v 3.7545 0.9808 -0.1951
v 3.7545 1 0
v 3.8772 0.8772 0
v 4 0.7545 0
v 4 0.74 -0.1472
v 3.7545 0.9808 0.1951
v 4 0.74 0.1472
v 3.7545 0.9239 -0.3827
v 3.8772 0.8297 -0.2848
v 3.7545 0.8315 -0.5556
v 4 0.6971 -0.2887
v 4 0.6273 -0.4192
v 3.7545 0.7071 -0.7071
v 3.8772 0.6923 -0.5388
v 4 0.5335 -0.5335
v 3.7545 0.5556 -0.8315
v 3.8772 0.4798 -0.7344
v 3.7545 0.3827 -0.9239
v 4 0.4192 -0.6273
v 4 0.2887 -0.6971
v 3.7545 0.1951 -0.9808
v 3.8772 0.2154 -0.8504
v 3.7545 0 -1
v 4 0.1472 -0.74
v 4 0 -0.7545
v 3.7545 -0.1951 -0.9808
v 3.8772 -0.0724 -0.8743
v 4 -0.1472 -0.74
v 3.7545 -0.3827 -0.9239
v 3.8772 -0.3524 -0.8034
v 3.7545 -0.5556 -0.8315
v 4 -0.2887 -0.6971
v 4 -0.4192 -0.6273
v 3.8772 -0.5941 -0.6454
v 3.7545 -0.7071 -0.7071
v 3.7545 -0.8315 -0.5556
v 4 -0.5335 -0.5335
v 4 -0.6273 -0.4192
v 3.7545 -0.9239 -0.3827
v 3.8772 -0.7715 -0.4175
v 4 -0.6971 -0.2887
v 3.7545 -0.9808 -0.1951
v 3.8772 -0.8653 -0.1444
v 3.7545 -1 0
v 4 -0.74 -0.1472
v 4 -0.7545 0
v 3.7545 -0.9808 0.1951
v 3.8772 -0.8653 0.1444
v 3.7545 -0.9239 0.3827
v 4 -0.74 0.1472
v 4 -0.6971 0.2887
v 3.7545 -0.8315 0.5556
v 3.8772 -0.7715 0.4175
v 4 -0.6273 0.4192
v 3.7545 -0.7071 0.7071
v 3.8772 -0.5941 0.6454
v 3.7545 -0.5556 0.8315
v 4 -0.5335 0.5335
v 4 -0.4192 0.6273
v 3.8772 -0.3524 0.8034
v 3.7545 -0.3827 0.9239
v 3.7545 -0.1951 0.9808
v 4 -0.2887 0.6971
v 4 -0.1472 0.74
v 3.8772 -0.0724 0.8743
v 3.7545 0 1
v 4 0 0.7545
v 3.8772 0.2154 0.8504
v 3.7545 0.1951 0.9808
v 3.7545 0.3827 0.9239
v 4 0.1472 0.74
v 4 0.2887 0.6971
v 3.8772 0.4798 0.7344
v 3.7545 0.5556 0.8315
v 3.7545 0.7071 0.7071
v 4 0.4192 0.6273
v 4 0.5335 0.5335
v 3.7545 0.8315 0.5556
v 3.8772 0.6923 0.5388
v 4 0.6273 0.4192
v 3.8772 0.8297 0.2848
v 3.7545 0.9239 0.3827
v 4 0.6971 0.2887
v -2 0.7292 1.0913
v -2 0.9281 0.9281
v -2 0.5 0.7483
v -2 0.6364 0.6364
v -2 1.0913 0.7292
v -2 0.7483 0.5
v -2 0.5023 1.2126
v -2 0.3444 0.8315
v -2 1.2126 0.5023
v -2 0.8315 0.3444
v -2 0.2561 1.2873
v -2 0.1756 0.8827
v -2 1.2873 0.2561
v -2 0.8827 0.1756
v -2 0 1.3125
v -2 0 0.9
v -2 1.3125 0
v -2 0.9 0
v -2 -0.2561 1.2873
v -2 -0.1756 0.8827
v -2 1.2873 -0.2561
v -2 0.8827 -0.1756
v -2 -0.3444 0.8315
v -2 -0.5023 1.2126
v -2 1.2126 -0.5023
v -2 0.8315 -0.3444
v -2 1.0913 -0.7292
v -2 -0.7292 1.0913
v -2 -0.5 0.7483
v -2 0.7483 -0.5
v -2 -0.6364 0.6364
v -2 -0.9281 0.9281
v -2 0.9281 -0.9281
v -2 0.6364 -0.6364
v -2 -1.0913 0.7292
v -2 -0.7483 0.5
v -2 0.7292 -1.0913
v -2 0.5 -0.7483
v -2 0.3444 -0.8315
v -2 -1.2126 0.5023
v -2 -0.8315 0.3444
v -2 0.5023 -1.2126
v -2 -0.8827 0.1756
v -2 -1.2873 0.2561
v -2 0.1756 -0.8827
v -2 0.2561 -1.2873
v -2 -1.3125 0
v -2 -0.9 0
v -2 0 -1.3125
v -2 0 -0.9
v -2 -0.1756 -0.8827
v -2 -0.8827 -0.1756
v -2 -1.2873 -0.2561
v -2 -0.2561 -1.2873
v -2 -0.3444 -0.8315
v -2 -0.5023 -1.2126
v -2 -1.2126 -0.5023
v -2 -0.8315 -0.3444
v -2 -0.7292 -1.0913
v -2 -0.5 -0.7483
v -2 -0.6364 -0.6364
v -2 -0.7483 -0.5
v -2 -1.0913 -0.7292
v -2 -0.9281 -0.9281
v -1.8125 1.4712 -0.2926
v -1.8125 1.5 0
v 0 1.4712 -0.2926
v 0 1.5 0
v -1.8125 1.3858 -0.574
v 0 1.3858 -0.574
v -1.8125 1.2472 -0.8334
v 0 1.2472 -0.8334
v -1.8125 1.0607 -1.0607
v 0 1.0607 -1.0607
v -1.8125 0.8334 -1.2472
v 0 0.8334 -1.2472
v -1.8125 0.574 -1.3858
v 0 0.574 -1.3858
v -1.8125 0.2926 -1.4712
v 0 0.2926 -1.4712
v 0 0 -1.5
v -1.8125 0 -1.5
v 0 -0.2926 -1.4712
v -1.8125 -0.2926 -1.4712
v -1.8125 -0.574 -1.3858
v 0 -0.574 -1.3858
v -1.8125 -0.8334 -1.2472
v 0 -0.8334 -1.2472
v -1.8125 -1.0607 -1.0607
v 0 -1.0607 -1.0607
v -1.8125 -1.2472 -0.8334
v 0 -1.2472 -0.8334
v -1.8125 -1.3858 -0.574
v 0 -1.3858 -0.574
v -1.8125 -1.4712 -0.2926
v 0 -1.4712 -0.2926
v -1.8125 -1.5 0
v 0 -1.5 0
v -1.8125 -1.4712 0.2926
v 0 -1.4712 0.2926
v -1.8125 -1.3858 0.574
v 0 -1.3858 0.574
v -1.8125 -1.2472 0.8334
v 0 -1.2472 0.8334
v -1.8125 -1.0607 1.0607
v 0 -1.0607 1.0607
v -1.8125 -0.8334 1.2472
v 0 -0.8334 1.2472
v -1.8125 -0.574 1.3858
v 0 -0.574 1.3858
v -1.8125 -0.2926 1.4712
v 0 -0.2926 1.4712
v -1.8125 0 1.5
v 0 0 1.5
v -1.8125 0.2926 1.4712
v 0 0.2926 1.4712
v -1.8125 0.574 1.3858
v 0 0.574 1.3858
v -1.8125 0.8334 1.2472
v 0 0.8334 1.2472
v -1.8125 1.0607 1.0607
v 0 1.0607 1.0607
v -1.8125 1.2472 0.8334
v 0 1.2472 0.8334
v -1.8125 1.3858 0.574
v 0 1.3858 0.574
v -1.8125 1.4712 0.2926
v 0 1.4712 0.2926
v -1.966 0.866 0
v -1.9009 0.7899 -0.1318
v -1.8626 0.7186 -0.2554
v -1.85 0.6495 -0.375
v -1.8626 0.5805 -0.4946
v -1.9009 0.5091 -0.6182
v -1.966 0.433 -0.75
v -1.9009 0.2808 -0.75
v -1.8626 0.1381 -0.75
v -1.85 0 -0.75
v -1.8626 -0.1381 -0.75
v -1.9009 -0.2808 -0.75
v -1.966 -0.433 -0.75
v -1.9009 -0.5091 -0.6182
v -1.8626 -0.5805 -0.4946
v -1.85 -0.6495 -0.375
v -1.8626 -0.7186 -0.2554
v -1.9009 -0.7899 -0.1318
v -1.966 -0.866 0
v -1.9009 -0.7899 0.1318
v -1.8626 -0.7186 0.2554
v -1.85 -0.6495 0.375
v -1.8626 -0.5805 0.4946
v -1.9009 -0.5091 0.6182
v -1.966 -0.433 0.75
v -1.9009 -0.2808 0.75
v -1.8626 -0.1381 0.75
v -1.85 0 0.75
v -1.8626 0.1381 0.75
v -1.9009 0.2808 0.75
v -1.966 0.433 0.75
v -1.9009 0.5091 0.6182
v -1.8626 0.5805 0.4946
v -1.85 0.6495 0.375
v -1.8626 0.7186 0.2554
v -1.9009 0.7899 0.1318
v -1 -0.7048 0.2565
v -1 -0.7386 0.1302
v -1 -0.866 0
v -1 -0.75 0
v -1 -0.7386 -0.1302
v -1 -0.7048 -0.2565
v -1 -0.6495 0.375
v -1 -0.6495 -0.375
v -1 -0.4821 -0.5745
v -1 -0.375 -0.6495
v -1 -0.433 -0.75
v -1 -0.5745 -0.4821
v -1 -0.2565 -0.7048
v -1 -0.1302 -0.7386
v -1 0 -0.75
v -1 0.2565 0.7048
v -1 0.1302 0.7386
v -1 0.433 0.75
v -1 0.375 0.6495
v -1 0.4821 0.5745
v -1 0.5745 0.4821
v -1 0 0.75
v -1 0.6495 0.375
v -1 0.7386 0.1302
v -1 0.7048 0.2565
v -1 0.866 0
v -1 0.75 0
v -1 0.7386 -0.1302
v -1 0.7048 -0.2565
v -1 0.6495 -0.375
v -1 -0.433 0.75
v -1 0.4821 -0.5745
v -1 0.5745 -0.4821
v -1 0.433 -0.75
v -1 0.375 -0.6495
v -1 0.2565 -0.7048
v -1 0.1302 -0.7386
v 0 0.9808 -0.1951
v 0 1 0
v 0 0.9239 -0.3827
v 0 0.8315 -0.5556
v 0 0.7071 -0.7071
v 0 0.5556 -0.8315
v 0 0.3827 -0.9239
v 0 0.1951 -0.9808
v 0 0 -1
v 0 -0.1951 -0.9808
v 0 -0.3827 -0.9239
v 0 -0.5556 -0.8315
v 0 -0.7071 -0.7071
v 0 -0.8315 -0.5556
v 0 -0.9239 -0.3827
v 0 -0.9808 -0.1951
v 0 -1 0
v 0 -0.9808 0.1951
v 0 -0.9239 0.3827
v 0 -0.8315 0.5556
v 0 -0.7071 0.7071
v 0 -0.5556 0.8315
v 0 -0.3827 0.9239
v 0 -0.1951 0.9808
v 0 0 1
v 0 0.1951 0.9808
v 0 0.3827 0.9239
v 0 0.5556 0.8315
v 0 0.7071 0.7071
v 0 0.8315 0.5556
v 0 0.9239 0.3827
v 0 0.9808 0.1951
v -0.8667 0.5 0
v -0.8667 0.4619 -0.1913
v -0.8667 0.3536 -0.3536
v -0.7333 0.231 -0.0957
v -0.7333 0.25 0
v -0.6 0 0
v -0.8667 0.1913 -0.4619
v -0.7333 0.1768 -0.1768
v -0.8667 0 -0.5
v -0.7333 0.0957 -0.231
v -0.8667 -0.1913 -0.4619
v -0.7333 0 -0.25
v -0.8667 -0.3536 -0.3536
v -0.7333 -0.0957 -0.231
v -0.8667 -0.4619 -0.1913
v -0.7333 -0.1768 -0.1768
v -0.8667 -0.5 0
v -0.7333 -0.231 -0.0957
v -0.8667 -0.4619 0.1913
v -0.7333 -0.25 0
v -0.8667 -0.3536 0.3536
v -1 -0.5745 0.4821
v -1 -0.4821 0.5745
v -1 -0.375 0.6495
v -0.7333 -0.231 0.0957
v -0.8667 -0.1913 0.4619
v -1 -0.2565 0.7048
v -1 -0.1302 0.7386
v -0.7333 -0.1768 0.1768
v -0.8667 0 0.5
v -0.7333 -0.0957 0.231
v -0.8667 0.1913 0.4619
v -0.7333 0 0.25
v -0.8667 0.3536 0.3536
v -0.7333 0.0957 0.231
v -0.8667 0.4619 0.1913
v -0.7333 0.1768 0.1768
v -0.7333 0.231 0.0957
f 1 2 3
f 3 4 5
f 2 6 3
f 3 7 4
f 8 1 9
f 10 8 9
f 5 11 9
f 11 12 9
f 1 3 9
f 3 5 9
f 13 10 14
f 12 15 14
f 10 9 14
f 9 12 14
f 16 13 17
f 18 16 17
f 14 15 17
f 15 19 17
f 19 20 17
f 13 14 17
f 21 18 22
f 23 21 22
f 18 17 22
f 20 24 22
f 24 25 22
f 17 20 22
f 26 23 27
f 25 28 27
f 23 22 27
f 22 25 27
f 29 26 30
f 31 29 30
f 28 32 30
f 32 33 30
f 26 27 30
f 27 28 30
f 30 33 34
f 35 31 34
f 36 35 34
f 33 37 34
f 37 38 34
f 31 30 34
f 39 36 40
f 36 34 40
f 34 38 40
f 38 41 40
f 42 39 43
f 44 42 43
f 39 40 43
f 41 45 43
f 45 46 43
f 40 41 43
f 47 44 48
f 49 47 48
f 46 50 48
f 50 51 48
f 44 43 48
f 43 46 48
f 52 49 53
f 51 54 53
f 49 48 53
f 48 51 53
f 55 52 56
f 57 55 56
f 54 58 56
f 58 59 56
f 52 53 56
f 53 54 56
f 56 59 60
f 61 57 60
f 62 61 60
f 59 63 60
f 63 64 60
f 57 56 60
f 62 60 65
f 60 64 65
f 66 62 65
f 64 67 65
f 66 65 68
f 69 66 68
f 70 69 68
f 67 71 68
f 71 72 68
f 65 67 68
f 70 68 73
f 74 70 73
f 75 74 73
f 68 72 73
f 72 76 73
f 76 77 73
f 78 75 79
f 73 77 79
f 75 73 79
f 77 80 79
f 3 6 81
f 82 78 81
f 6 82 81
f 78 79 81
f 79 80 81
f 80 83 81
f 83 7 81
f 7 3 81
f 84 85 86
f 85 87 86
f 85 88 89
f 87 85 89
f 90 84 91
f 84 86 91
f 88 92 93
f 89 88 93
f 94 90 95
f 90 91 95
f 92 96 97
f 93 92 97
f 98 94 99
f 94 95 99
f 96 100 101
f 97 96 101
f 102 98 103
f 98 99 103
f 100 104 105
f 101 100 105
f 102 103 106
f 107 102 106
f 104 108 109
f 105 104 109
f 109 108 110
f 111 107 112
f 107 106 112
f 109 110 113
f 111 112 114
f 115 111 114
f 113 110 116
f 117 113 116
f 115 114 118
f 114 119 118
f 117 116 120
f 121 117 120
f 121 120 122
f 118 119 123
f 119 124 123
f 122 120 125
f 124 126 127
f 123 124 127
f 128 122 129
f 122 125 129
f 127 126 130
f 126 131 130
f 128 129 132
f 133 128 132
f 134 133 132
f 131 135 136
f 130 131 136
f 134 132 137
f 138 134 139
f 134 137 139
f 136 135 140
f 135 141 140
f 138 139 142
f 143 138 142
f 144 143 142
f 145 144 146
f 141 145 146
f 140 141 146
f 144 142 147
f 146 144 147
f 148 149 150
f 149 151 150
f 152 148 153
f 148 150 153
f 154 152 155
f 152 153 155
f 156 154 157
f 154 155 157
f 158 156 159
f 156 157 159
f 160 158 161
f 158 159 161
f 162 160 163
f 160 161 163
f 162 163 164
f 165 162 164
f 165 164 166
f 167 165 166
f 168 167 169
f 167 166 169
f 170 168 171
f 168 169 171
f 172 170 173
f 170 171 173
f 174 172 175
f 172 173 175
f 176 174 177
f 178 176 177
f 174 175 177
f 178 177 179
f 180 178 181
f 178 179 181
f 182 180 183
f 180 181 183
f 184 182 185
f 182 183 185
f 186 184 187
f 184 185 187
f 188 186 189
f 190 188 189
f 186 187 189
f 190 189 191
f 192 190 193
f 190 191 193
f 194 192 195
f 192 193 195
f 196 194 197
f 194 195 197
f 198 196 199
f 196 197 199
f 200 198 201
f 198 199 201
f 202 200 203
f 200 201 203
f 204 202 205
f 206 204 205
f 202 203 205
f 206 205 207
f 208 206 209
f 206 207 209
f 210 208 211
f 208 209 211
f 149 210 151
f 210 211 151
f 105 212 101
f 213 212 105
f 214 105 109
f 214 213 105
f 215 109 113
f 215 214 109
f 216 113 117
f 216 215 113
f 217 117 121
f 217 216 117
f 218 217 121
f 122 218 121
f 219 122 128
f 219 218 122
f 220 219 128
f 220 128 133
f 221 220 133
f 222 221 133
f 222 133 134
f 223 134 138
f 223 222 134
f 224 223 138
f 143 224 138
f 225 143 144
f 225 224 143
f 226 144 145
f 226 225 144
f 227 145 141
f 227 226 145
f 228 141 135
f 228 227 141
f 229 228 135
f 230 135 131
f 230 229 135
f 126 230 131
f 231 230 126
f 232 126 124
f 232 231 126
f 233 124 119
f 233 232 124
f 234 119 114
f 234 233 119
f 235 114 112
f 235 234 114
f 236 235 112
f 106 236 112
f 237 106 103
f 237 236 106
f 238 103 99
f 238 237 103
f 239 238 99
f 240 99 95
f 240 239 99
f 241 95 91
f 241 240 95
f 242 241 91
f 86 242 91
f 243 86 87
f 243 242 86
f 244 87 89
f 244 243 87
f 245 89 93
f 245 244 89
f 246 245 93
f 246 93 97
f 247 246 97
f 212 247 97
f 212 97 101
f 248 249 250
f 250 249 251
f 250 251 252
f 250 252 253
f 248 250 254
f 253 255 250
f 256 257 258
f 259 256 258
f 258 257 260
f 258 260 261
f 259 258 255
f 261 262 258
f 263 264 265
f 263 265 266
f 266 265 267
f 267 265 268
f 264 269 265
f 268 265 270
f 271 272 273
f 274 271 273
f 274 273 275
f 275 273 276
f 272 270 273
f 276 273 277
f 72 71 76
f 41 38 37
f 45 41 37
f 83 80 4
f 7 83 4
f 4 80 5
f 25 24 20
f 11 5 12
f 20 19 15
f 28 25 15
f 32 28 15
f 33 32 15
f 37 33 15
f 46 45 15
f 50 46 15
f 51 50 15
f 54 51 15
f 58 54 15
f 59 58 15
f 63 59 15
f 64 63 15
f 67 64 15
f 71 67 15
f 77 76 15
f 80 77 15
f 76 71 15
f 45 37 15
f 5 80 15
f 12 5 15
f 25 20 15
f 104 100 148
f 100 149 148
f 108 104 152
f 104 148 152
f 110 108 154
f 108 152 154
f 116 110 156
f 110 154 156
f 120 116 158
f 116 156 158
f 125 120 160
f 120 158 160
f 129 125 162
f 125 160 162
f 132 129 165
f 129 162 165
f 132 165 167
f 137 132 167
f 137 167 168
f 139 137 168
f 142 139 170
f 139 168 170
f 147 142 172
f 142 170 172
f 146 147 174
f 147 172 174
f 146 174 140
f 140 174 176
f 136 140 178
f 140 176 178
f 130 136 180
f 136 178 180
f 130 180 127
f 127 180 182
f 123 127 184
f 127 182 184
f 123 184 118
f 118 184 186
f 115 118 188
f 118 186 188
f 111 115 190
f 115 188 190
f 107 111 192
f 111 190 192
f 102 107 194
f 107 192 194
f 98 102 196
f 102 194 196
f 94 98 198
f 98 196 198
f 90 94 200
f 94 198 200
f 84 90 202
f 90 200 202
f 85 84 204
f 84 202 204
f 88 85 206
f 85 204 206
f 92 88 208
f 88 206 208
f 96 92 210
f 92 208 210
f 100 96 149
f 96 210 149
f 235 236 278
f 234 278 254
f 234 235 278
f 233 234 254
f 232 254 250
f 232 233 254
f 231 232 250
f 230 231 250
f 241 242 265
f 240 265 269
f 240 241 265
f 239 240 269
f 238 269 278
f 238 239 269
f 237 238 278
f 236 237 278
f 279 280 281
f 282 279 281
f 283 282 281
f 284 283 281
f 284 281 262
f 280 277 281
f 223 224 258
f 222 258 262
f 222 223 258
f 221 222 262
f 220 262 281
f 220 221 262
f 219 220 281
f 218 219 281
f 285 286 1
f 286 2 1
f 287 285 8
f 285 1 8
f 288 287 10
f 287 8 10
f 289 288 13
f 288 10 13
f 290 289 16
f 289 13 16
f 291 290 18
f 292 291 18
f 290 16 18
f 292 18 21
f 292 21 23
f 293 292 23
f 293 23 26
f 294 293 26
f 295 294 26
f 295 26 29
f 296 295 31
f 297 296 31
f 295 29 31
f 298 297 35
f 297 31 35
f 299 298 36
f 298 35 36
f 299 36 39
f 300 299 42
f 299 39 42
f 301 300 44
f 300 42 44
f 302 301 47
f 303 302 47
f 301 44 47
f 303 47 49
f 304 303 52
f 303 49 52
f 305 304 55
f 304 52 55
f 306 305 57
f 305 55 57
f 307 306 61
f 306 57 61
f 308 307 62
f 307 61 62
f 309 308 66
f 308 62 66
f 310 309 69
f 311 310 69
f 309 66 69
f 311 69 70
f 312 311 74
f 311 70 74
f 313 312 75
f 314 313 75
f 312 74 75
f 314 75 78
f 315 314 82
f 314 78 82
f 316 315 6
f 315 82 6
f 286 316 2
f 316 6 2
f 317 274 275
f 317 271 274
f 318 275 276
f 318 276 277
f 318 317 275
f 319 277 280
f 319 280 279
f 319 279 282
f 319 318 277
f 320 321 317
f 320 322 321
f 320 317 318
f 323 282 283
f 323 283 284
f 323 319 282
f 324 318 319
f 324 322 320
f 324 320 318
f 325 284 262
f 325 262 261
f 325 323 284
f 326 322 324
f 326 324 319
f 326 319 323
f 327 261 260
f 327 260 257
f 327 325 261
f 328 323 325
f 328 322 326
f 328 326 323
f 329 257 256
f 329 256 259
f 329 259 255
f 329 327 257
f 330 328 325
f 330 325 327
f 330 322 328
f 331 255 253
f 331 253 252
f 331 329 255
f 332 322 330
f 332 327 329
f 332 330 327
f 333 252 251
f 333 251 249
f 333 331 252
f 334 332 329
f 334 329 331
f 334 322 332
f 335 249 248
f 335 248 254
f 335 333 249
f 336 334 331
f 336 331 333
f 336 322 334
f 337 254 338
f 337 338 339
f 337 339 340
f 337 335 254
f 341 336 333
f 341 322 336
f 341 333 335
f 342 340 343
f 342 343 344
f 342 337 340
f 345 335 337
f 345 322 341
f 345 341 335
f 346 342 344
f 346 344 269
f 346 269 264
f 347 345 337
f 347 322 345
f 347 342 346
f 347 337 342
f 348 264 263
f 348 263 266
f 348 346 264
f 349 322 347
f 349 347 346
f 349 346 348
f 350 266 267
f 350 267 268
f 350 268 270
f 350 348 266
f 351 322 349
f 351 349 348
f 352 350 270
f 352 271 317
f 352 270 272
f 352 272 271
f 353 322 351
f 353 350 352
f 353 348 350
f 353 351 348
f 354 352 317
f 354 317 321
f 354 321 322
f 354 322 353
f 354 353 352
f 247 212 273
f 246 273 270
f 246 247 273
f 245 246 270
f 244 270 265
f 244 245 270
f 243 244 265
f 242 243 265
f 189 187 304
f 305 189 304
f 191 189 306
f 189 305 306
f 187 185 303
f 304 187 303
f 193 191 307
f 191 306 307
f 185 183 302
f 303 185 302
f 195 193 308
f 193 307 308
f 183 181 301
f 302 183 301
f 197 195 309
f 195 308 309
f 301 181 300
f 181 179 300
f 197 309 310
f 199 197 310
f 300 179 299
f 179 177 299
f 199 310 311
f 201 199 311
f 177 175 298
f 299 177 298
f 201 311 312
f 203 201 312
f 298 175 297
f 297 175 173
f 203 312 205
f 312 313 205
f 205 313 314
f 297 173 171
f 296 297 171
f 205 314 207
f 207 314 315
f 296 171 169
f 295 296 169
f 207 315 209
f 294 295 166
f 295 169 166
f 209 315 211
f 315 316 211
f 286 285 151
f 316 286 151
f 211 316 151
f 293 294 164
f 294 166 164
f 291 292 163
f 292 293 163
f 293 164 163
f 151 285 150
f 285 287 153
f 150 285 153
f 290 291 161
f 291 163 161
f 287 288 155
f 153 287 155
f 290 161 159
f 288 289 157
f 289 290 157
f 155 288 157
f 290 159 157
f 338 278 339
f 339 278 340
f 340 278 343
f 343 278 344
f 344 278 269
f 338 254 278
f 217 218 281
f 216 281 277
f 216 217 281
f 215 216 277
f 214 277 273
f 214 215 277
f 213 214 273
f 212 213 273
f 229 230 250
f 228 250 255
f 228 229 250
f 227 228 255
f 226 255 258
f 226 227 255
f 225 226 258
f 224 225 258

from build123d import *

# Parameters (mm, degrees)
CUT_EXTRUDE1_DEPTH = 1


with BuildPart() as part:
    # Sketch1 → Revolve1 (revolve)
    with BuildSketch(Plane.XY):
        Polygon((-2, 0), (-2, 1.3125), (-1.8125, 1.5), (0, 1.5), (0, 1), (3.7545, 1), (4, 0.7545), (4, 0), align=None)
    revolve(axis=Axis((4, 0, 0), (-1, 0, 0)))

    # Sketch2 → Cut-Revolve1 (revolve, cut)
    with BuildSketch(Plane.XY):
        Polygon((-2, 0), (-2, 0.9), (-1.85, 0.75), (-1, 0.75), (-0.6, 0), align=None)
    revolve(axis=Axis((-0.6, 0, 0), (-1, 0, 0)), mode=Mode.SUBTRACT)

    # Sketch3 → Cut-Extrude1 (cut)
    with BuildSketch(Plane(origin=(-2, 0, 0), x_dir=(0, 0, -1), z_dir=(1, 0, 0))):
        Polygon((-0.75, -0.433012702), (0, -0.866025404), (0.75, -0.433012702), (0.75, 0.433012702), (0, 0.866025404), (-0.75, 0.433012702), align=None)
    extrude(amount=CUT_EXTRUDE1_DEPTH, mode=Mode.SUBTRACT)


solid = part.part
